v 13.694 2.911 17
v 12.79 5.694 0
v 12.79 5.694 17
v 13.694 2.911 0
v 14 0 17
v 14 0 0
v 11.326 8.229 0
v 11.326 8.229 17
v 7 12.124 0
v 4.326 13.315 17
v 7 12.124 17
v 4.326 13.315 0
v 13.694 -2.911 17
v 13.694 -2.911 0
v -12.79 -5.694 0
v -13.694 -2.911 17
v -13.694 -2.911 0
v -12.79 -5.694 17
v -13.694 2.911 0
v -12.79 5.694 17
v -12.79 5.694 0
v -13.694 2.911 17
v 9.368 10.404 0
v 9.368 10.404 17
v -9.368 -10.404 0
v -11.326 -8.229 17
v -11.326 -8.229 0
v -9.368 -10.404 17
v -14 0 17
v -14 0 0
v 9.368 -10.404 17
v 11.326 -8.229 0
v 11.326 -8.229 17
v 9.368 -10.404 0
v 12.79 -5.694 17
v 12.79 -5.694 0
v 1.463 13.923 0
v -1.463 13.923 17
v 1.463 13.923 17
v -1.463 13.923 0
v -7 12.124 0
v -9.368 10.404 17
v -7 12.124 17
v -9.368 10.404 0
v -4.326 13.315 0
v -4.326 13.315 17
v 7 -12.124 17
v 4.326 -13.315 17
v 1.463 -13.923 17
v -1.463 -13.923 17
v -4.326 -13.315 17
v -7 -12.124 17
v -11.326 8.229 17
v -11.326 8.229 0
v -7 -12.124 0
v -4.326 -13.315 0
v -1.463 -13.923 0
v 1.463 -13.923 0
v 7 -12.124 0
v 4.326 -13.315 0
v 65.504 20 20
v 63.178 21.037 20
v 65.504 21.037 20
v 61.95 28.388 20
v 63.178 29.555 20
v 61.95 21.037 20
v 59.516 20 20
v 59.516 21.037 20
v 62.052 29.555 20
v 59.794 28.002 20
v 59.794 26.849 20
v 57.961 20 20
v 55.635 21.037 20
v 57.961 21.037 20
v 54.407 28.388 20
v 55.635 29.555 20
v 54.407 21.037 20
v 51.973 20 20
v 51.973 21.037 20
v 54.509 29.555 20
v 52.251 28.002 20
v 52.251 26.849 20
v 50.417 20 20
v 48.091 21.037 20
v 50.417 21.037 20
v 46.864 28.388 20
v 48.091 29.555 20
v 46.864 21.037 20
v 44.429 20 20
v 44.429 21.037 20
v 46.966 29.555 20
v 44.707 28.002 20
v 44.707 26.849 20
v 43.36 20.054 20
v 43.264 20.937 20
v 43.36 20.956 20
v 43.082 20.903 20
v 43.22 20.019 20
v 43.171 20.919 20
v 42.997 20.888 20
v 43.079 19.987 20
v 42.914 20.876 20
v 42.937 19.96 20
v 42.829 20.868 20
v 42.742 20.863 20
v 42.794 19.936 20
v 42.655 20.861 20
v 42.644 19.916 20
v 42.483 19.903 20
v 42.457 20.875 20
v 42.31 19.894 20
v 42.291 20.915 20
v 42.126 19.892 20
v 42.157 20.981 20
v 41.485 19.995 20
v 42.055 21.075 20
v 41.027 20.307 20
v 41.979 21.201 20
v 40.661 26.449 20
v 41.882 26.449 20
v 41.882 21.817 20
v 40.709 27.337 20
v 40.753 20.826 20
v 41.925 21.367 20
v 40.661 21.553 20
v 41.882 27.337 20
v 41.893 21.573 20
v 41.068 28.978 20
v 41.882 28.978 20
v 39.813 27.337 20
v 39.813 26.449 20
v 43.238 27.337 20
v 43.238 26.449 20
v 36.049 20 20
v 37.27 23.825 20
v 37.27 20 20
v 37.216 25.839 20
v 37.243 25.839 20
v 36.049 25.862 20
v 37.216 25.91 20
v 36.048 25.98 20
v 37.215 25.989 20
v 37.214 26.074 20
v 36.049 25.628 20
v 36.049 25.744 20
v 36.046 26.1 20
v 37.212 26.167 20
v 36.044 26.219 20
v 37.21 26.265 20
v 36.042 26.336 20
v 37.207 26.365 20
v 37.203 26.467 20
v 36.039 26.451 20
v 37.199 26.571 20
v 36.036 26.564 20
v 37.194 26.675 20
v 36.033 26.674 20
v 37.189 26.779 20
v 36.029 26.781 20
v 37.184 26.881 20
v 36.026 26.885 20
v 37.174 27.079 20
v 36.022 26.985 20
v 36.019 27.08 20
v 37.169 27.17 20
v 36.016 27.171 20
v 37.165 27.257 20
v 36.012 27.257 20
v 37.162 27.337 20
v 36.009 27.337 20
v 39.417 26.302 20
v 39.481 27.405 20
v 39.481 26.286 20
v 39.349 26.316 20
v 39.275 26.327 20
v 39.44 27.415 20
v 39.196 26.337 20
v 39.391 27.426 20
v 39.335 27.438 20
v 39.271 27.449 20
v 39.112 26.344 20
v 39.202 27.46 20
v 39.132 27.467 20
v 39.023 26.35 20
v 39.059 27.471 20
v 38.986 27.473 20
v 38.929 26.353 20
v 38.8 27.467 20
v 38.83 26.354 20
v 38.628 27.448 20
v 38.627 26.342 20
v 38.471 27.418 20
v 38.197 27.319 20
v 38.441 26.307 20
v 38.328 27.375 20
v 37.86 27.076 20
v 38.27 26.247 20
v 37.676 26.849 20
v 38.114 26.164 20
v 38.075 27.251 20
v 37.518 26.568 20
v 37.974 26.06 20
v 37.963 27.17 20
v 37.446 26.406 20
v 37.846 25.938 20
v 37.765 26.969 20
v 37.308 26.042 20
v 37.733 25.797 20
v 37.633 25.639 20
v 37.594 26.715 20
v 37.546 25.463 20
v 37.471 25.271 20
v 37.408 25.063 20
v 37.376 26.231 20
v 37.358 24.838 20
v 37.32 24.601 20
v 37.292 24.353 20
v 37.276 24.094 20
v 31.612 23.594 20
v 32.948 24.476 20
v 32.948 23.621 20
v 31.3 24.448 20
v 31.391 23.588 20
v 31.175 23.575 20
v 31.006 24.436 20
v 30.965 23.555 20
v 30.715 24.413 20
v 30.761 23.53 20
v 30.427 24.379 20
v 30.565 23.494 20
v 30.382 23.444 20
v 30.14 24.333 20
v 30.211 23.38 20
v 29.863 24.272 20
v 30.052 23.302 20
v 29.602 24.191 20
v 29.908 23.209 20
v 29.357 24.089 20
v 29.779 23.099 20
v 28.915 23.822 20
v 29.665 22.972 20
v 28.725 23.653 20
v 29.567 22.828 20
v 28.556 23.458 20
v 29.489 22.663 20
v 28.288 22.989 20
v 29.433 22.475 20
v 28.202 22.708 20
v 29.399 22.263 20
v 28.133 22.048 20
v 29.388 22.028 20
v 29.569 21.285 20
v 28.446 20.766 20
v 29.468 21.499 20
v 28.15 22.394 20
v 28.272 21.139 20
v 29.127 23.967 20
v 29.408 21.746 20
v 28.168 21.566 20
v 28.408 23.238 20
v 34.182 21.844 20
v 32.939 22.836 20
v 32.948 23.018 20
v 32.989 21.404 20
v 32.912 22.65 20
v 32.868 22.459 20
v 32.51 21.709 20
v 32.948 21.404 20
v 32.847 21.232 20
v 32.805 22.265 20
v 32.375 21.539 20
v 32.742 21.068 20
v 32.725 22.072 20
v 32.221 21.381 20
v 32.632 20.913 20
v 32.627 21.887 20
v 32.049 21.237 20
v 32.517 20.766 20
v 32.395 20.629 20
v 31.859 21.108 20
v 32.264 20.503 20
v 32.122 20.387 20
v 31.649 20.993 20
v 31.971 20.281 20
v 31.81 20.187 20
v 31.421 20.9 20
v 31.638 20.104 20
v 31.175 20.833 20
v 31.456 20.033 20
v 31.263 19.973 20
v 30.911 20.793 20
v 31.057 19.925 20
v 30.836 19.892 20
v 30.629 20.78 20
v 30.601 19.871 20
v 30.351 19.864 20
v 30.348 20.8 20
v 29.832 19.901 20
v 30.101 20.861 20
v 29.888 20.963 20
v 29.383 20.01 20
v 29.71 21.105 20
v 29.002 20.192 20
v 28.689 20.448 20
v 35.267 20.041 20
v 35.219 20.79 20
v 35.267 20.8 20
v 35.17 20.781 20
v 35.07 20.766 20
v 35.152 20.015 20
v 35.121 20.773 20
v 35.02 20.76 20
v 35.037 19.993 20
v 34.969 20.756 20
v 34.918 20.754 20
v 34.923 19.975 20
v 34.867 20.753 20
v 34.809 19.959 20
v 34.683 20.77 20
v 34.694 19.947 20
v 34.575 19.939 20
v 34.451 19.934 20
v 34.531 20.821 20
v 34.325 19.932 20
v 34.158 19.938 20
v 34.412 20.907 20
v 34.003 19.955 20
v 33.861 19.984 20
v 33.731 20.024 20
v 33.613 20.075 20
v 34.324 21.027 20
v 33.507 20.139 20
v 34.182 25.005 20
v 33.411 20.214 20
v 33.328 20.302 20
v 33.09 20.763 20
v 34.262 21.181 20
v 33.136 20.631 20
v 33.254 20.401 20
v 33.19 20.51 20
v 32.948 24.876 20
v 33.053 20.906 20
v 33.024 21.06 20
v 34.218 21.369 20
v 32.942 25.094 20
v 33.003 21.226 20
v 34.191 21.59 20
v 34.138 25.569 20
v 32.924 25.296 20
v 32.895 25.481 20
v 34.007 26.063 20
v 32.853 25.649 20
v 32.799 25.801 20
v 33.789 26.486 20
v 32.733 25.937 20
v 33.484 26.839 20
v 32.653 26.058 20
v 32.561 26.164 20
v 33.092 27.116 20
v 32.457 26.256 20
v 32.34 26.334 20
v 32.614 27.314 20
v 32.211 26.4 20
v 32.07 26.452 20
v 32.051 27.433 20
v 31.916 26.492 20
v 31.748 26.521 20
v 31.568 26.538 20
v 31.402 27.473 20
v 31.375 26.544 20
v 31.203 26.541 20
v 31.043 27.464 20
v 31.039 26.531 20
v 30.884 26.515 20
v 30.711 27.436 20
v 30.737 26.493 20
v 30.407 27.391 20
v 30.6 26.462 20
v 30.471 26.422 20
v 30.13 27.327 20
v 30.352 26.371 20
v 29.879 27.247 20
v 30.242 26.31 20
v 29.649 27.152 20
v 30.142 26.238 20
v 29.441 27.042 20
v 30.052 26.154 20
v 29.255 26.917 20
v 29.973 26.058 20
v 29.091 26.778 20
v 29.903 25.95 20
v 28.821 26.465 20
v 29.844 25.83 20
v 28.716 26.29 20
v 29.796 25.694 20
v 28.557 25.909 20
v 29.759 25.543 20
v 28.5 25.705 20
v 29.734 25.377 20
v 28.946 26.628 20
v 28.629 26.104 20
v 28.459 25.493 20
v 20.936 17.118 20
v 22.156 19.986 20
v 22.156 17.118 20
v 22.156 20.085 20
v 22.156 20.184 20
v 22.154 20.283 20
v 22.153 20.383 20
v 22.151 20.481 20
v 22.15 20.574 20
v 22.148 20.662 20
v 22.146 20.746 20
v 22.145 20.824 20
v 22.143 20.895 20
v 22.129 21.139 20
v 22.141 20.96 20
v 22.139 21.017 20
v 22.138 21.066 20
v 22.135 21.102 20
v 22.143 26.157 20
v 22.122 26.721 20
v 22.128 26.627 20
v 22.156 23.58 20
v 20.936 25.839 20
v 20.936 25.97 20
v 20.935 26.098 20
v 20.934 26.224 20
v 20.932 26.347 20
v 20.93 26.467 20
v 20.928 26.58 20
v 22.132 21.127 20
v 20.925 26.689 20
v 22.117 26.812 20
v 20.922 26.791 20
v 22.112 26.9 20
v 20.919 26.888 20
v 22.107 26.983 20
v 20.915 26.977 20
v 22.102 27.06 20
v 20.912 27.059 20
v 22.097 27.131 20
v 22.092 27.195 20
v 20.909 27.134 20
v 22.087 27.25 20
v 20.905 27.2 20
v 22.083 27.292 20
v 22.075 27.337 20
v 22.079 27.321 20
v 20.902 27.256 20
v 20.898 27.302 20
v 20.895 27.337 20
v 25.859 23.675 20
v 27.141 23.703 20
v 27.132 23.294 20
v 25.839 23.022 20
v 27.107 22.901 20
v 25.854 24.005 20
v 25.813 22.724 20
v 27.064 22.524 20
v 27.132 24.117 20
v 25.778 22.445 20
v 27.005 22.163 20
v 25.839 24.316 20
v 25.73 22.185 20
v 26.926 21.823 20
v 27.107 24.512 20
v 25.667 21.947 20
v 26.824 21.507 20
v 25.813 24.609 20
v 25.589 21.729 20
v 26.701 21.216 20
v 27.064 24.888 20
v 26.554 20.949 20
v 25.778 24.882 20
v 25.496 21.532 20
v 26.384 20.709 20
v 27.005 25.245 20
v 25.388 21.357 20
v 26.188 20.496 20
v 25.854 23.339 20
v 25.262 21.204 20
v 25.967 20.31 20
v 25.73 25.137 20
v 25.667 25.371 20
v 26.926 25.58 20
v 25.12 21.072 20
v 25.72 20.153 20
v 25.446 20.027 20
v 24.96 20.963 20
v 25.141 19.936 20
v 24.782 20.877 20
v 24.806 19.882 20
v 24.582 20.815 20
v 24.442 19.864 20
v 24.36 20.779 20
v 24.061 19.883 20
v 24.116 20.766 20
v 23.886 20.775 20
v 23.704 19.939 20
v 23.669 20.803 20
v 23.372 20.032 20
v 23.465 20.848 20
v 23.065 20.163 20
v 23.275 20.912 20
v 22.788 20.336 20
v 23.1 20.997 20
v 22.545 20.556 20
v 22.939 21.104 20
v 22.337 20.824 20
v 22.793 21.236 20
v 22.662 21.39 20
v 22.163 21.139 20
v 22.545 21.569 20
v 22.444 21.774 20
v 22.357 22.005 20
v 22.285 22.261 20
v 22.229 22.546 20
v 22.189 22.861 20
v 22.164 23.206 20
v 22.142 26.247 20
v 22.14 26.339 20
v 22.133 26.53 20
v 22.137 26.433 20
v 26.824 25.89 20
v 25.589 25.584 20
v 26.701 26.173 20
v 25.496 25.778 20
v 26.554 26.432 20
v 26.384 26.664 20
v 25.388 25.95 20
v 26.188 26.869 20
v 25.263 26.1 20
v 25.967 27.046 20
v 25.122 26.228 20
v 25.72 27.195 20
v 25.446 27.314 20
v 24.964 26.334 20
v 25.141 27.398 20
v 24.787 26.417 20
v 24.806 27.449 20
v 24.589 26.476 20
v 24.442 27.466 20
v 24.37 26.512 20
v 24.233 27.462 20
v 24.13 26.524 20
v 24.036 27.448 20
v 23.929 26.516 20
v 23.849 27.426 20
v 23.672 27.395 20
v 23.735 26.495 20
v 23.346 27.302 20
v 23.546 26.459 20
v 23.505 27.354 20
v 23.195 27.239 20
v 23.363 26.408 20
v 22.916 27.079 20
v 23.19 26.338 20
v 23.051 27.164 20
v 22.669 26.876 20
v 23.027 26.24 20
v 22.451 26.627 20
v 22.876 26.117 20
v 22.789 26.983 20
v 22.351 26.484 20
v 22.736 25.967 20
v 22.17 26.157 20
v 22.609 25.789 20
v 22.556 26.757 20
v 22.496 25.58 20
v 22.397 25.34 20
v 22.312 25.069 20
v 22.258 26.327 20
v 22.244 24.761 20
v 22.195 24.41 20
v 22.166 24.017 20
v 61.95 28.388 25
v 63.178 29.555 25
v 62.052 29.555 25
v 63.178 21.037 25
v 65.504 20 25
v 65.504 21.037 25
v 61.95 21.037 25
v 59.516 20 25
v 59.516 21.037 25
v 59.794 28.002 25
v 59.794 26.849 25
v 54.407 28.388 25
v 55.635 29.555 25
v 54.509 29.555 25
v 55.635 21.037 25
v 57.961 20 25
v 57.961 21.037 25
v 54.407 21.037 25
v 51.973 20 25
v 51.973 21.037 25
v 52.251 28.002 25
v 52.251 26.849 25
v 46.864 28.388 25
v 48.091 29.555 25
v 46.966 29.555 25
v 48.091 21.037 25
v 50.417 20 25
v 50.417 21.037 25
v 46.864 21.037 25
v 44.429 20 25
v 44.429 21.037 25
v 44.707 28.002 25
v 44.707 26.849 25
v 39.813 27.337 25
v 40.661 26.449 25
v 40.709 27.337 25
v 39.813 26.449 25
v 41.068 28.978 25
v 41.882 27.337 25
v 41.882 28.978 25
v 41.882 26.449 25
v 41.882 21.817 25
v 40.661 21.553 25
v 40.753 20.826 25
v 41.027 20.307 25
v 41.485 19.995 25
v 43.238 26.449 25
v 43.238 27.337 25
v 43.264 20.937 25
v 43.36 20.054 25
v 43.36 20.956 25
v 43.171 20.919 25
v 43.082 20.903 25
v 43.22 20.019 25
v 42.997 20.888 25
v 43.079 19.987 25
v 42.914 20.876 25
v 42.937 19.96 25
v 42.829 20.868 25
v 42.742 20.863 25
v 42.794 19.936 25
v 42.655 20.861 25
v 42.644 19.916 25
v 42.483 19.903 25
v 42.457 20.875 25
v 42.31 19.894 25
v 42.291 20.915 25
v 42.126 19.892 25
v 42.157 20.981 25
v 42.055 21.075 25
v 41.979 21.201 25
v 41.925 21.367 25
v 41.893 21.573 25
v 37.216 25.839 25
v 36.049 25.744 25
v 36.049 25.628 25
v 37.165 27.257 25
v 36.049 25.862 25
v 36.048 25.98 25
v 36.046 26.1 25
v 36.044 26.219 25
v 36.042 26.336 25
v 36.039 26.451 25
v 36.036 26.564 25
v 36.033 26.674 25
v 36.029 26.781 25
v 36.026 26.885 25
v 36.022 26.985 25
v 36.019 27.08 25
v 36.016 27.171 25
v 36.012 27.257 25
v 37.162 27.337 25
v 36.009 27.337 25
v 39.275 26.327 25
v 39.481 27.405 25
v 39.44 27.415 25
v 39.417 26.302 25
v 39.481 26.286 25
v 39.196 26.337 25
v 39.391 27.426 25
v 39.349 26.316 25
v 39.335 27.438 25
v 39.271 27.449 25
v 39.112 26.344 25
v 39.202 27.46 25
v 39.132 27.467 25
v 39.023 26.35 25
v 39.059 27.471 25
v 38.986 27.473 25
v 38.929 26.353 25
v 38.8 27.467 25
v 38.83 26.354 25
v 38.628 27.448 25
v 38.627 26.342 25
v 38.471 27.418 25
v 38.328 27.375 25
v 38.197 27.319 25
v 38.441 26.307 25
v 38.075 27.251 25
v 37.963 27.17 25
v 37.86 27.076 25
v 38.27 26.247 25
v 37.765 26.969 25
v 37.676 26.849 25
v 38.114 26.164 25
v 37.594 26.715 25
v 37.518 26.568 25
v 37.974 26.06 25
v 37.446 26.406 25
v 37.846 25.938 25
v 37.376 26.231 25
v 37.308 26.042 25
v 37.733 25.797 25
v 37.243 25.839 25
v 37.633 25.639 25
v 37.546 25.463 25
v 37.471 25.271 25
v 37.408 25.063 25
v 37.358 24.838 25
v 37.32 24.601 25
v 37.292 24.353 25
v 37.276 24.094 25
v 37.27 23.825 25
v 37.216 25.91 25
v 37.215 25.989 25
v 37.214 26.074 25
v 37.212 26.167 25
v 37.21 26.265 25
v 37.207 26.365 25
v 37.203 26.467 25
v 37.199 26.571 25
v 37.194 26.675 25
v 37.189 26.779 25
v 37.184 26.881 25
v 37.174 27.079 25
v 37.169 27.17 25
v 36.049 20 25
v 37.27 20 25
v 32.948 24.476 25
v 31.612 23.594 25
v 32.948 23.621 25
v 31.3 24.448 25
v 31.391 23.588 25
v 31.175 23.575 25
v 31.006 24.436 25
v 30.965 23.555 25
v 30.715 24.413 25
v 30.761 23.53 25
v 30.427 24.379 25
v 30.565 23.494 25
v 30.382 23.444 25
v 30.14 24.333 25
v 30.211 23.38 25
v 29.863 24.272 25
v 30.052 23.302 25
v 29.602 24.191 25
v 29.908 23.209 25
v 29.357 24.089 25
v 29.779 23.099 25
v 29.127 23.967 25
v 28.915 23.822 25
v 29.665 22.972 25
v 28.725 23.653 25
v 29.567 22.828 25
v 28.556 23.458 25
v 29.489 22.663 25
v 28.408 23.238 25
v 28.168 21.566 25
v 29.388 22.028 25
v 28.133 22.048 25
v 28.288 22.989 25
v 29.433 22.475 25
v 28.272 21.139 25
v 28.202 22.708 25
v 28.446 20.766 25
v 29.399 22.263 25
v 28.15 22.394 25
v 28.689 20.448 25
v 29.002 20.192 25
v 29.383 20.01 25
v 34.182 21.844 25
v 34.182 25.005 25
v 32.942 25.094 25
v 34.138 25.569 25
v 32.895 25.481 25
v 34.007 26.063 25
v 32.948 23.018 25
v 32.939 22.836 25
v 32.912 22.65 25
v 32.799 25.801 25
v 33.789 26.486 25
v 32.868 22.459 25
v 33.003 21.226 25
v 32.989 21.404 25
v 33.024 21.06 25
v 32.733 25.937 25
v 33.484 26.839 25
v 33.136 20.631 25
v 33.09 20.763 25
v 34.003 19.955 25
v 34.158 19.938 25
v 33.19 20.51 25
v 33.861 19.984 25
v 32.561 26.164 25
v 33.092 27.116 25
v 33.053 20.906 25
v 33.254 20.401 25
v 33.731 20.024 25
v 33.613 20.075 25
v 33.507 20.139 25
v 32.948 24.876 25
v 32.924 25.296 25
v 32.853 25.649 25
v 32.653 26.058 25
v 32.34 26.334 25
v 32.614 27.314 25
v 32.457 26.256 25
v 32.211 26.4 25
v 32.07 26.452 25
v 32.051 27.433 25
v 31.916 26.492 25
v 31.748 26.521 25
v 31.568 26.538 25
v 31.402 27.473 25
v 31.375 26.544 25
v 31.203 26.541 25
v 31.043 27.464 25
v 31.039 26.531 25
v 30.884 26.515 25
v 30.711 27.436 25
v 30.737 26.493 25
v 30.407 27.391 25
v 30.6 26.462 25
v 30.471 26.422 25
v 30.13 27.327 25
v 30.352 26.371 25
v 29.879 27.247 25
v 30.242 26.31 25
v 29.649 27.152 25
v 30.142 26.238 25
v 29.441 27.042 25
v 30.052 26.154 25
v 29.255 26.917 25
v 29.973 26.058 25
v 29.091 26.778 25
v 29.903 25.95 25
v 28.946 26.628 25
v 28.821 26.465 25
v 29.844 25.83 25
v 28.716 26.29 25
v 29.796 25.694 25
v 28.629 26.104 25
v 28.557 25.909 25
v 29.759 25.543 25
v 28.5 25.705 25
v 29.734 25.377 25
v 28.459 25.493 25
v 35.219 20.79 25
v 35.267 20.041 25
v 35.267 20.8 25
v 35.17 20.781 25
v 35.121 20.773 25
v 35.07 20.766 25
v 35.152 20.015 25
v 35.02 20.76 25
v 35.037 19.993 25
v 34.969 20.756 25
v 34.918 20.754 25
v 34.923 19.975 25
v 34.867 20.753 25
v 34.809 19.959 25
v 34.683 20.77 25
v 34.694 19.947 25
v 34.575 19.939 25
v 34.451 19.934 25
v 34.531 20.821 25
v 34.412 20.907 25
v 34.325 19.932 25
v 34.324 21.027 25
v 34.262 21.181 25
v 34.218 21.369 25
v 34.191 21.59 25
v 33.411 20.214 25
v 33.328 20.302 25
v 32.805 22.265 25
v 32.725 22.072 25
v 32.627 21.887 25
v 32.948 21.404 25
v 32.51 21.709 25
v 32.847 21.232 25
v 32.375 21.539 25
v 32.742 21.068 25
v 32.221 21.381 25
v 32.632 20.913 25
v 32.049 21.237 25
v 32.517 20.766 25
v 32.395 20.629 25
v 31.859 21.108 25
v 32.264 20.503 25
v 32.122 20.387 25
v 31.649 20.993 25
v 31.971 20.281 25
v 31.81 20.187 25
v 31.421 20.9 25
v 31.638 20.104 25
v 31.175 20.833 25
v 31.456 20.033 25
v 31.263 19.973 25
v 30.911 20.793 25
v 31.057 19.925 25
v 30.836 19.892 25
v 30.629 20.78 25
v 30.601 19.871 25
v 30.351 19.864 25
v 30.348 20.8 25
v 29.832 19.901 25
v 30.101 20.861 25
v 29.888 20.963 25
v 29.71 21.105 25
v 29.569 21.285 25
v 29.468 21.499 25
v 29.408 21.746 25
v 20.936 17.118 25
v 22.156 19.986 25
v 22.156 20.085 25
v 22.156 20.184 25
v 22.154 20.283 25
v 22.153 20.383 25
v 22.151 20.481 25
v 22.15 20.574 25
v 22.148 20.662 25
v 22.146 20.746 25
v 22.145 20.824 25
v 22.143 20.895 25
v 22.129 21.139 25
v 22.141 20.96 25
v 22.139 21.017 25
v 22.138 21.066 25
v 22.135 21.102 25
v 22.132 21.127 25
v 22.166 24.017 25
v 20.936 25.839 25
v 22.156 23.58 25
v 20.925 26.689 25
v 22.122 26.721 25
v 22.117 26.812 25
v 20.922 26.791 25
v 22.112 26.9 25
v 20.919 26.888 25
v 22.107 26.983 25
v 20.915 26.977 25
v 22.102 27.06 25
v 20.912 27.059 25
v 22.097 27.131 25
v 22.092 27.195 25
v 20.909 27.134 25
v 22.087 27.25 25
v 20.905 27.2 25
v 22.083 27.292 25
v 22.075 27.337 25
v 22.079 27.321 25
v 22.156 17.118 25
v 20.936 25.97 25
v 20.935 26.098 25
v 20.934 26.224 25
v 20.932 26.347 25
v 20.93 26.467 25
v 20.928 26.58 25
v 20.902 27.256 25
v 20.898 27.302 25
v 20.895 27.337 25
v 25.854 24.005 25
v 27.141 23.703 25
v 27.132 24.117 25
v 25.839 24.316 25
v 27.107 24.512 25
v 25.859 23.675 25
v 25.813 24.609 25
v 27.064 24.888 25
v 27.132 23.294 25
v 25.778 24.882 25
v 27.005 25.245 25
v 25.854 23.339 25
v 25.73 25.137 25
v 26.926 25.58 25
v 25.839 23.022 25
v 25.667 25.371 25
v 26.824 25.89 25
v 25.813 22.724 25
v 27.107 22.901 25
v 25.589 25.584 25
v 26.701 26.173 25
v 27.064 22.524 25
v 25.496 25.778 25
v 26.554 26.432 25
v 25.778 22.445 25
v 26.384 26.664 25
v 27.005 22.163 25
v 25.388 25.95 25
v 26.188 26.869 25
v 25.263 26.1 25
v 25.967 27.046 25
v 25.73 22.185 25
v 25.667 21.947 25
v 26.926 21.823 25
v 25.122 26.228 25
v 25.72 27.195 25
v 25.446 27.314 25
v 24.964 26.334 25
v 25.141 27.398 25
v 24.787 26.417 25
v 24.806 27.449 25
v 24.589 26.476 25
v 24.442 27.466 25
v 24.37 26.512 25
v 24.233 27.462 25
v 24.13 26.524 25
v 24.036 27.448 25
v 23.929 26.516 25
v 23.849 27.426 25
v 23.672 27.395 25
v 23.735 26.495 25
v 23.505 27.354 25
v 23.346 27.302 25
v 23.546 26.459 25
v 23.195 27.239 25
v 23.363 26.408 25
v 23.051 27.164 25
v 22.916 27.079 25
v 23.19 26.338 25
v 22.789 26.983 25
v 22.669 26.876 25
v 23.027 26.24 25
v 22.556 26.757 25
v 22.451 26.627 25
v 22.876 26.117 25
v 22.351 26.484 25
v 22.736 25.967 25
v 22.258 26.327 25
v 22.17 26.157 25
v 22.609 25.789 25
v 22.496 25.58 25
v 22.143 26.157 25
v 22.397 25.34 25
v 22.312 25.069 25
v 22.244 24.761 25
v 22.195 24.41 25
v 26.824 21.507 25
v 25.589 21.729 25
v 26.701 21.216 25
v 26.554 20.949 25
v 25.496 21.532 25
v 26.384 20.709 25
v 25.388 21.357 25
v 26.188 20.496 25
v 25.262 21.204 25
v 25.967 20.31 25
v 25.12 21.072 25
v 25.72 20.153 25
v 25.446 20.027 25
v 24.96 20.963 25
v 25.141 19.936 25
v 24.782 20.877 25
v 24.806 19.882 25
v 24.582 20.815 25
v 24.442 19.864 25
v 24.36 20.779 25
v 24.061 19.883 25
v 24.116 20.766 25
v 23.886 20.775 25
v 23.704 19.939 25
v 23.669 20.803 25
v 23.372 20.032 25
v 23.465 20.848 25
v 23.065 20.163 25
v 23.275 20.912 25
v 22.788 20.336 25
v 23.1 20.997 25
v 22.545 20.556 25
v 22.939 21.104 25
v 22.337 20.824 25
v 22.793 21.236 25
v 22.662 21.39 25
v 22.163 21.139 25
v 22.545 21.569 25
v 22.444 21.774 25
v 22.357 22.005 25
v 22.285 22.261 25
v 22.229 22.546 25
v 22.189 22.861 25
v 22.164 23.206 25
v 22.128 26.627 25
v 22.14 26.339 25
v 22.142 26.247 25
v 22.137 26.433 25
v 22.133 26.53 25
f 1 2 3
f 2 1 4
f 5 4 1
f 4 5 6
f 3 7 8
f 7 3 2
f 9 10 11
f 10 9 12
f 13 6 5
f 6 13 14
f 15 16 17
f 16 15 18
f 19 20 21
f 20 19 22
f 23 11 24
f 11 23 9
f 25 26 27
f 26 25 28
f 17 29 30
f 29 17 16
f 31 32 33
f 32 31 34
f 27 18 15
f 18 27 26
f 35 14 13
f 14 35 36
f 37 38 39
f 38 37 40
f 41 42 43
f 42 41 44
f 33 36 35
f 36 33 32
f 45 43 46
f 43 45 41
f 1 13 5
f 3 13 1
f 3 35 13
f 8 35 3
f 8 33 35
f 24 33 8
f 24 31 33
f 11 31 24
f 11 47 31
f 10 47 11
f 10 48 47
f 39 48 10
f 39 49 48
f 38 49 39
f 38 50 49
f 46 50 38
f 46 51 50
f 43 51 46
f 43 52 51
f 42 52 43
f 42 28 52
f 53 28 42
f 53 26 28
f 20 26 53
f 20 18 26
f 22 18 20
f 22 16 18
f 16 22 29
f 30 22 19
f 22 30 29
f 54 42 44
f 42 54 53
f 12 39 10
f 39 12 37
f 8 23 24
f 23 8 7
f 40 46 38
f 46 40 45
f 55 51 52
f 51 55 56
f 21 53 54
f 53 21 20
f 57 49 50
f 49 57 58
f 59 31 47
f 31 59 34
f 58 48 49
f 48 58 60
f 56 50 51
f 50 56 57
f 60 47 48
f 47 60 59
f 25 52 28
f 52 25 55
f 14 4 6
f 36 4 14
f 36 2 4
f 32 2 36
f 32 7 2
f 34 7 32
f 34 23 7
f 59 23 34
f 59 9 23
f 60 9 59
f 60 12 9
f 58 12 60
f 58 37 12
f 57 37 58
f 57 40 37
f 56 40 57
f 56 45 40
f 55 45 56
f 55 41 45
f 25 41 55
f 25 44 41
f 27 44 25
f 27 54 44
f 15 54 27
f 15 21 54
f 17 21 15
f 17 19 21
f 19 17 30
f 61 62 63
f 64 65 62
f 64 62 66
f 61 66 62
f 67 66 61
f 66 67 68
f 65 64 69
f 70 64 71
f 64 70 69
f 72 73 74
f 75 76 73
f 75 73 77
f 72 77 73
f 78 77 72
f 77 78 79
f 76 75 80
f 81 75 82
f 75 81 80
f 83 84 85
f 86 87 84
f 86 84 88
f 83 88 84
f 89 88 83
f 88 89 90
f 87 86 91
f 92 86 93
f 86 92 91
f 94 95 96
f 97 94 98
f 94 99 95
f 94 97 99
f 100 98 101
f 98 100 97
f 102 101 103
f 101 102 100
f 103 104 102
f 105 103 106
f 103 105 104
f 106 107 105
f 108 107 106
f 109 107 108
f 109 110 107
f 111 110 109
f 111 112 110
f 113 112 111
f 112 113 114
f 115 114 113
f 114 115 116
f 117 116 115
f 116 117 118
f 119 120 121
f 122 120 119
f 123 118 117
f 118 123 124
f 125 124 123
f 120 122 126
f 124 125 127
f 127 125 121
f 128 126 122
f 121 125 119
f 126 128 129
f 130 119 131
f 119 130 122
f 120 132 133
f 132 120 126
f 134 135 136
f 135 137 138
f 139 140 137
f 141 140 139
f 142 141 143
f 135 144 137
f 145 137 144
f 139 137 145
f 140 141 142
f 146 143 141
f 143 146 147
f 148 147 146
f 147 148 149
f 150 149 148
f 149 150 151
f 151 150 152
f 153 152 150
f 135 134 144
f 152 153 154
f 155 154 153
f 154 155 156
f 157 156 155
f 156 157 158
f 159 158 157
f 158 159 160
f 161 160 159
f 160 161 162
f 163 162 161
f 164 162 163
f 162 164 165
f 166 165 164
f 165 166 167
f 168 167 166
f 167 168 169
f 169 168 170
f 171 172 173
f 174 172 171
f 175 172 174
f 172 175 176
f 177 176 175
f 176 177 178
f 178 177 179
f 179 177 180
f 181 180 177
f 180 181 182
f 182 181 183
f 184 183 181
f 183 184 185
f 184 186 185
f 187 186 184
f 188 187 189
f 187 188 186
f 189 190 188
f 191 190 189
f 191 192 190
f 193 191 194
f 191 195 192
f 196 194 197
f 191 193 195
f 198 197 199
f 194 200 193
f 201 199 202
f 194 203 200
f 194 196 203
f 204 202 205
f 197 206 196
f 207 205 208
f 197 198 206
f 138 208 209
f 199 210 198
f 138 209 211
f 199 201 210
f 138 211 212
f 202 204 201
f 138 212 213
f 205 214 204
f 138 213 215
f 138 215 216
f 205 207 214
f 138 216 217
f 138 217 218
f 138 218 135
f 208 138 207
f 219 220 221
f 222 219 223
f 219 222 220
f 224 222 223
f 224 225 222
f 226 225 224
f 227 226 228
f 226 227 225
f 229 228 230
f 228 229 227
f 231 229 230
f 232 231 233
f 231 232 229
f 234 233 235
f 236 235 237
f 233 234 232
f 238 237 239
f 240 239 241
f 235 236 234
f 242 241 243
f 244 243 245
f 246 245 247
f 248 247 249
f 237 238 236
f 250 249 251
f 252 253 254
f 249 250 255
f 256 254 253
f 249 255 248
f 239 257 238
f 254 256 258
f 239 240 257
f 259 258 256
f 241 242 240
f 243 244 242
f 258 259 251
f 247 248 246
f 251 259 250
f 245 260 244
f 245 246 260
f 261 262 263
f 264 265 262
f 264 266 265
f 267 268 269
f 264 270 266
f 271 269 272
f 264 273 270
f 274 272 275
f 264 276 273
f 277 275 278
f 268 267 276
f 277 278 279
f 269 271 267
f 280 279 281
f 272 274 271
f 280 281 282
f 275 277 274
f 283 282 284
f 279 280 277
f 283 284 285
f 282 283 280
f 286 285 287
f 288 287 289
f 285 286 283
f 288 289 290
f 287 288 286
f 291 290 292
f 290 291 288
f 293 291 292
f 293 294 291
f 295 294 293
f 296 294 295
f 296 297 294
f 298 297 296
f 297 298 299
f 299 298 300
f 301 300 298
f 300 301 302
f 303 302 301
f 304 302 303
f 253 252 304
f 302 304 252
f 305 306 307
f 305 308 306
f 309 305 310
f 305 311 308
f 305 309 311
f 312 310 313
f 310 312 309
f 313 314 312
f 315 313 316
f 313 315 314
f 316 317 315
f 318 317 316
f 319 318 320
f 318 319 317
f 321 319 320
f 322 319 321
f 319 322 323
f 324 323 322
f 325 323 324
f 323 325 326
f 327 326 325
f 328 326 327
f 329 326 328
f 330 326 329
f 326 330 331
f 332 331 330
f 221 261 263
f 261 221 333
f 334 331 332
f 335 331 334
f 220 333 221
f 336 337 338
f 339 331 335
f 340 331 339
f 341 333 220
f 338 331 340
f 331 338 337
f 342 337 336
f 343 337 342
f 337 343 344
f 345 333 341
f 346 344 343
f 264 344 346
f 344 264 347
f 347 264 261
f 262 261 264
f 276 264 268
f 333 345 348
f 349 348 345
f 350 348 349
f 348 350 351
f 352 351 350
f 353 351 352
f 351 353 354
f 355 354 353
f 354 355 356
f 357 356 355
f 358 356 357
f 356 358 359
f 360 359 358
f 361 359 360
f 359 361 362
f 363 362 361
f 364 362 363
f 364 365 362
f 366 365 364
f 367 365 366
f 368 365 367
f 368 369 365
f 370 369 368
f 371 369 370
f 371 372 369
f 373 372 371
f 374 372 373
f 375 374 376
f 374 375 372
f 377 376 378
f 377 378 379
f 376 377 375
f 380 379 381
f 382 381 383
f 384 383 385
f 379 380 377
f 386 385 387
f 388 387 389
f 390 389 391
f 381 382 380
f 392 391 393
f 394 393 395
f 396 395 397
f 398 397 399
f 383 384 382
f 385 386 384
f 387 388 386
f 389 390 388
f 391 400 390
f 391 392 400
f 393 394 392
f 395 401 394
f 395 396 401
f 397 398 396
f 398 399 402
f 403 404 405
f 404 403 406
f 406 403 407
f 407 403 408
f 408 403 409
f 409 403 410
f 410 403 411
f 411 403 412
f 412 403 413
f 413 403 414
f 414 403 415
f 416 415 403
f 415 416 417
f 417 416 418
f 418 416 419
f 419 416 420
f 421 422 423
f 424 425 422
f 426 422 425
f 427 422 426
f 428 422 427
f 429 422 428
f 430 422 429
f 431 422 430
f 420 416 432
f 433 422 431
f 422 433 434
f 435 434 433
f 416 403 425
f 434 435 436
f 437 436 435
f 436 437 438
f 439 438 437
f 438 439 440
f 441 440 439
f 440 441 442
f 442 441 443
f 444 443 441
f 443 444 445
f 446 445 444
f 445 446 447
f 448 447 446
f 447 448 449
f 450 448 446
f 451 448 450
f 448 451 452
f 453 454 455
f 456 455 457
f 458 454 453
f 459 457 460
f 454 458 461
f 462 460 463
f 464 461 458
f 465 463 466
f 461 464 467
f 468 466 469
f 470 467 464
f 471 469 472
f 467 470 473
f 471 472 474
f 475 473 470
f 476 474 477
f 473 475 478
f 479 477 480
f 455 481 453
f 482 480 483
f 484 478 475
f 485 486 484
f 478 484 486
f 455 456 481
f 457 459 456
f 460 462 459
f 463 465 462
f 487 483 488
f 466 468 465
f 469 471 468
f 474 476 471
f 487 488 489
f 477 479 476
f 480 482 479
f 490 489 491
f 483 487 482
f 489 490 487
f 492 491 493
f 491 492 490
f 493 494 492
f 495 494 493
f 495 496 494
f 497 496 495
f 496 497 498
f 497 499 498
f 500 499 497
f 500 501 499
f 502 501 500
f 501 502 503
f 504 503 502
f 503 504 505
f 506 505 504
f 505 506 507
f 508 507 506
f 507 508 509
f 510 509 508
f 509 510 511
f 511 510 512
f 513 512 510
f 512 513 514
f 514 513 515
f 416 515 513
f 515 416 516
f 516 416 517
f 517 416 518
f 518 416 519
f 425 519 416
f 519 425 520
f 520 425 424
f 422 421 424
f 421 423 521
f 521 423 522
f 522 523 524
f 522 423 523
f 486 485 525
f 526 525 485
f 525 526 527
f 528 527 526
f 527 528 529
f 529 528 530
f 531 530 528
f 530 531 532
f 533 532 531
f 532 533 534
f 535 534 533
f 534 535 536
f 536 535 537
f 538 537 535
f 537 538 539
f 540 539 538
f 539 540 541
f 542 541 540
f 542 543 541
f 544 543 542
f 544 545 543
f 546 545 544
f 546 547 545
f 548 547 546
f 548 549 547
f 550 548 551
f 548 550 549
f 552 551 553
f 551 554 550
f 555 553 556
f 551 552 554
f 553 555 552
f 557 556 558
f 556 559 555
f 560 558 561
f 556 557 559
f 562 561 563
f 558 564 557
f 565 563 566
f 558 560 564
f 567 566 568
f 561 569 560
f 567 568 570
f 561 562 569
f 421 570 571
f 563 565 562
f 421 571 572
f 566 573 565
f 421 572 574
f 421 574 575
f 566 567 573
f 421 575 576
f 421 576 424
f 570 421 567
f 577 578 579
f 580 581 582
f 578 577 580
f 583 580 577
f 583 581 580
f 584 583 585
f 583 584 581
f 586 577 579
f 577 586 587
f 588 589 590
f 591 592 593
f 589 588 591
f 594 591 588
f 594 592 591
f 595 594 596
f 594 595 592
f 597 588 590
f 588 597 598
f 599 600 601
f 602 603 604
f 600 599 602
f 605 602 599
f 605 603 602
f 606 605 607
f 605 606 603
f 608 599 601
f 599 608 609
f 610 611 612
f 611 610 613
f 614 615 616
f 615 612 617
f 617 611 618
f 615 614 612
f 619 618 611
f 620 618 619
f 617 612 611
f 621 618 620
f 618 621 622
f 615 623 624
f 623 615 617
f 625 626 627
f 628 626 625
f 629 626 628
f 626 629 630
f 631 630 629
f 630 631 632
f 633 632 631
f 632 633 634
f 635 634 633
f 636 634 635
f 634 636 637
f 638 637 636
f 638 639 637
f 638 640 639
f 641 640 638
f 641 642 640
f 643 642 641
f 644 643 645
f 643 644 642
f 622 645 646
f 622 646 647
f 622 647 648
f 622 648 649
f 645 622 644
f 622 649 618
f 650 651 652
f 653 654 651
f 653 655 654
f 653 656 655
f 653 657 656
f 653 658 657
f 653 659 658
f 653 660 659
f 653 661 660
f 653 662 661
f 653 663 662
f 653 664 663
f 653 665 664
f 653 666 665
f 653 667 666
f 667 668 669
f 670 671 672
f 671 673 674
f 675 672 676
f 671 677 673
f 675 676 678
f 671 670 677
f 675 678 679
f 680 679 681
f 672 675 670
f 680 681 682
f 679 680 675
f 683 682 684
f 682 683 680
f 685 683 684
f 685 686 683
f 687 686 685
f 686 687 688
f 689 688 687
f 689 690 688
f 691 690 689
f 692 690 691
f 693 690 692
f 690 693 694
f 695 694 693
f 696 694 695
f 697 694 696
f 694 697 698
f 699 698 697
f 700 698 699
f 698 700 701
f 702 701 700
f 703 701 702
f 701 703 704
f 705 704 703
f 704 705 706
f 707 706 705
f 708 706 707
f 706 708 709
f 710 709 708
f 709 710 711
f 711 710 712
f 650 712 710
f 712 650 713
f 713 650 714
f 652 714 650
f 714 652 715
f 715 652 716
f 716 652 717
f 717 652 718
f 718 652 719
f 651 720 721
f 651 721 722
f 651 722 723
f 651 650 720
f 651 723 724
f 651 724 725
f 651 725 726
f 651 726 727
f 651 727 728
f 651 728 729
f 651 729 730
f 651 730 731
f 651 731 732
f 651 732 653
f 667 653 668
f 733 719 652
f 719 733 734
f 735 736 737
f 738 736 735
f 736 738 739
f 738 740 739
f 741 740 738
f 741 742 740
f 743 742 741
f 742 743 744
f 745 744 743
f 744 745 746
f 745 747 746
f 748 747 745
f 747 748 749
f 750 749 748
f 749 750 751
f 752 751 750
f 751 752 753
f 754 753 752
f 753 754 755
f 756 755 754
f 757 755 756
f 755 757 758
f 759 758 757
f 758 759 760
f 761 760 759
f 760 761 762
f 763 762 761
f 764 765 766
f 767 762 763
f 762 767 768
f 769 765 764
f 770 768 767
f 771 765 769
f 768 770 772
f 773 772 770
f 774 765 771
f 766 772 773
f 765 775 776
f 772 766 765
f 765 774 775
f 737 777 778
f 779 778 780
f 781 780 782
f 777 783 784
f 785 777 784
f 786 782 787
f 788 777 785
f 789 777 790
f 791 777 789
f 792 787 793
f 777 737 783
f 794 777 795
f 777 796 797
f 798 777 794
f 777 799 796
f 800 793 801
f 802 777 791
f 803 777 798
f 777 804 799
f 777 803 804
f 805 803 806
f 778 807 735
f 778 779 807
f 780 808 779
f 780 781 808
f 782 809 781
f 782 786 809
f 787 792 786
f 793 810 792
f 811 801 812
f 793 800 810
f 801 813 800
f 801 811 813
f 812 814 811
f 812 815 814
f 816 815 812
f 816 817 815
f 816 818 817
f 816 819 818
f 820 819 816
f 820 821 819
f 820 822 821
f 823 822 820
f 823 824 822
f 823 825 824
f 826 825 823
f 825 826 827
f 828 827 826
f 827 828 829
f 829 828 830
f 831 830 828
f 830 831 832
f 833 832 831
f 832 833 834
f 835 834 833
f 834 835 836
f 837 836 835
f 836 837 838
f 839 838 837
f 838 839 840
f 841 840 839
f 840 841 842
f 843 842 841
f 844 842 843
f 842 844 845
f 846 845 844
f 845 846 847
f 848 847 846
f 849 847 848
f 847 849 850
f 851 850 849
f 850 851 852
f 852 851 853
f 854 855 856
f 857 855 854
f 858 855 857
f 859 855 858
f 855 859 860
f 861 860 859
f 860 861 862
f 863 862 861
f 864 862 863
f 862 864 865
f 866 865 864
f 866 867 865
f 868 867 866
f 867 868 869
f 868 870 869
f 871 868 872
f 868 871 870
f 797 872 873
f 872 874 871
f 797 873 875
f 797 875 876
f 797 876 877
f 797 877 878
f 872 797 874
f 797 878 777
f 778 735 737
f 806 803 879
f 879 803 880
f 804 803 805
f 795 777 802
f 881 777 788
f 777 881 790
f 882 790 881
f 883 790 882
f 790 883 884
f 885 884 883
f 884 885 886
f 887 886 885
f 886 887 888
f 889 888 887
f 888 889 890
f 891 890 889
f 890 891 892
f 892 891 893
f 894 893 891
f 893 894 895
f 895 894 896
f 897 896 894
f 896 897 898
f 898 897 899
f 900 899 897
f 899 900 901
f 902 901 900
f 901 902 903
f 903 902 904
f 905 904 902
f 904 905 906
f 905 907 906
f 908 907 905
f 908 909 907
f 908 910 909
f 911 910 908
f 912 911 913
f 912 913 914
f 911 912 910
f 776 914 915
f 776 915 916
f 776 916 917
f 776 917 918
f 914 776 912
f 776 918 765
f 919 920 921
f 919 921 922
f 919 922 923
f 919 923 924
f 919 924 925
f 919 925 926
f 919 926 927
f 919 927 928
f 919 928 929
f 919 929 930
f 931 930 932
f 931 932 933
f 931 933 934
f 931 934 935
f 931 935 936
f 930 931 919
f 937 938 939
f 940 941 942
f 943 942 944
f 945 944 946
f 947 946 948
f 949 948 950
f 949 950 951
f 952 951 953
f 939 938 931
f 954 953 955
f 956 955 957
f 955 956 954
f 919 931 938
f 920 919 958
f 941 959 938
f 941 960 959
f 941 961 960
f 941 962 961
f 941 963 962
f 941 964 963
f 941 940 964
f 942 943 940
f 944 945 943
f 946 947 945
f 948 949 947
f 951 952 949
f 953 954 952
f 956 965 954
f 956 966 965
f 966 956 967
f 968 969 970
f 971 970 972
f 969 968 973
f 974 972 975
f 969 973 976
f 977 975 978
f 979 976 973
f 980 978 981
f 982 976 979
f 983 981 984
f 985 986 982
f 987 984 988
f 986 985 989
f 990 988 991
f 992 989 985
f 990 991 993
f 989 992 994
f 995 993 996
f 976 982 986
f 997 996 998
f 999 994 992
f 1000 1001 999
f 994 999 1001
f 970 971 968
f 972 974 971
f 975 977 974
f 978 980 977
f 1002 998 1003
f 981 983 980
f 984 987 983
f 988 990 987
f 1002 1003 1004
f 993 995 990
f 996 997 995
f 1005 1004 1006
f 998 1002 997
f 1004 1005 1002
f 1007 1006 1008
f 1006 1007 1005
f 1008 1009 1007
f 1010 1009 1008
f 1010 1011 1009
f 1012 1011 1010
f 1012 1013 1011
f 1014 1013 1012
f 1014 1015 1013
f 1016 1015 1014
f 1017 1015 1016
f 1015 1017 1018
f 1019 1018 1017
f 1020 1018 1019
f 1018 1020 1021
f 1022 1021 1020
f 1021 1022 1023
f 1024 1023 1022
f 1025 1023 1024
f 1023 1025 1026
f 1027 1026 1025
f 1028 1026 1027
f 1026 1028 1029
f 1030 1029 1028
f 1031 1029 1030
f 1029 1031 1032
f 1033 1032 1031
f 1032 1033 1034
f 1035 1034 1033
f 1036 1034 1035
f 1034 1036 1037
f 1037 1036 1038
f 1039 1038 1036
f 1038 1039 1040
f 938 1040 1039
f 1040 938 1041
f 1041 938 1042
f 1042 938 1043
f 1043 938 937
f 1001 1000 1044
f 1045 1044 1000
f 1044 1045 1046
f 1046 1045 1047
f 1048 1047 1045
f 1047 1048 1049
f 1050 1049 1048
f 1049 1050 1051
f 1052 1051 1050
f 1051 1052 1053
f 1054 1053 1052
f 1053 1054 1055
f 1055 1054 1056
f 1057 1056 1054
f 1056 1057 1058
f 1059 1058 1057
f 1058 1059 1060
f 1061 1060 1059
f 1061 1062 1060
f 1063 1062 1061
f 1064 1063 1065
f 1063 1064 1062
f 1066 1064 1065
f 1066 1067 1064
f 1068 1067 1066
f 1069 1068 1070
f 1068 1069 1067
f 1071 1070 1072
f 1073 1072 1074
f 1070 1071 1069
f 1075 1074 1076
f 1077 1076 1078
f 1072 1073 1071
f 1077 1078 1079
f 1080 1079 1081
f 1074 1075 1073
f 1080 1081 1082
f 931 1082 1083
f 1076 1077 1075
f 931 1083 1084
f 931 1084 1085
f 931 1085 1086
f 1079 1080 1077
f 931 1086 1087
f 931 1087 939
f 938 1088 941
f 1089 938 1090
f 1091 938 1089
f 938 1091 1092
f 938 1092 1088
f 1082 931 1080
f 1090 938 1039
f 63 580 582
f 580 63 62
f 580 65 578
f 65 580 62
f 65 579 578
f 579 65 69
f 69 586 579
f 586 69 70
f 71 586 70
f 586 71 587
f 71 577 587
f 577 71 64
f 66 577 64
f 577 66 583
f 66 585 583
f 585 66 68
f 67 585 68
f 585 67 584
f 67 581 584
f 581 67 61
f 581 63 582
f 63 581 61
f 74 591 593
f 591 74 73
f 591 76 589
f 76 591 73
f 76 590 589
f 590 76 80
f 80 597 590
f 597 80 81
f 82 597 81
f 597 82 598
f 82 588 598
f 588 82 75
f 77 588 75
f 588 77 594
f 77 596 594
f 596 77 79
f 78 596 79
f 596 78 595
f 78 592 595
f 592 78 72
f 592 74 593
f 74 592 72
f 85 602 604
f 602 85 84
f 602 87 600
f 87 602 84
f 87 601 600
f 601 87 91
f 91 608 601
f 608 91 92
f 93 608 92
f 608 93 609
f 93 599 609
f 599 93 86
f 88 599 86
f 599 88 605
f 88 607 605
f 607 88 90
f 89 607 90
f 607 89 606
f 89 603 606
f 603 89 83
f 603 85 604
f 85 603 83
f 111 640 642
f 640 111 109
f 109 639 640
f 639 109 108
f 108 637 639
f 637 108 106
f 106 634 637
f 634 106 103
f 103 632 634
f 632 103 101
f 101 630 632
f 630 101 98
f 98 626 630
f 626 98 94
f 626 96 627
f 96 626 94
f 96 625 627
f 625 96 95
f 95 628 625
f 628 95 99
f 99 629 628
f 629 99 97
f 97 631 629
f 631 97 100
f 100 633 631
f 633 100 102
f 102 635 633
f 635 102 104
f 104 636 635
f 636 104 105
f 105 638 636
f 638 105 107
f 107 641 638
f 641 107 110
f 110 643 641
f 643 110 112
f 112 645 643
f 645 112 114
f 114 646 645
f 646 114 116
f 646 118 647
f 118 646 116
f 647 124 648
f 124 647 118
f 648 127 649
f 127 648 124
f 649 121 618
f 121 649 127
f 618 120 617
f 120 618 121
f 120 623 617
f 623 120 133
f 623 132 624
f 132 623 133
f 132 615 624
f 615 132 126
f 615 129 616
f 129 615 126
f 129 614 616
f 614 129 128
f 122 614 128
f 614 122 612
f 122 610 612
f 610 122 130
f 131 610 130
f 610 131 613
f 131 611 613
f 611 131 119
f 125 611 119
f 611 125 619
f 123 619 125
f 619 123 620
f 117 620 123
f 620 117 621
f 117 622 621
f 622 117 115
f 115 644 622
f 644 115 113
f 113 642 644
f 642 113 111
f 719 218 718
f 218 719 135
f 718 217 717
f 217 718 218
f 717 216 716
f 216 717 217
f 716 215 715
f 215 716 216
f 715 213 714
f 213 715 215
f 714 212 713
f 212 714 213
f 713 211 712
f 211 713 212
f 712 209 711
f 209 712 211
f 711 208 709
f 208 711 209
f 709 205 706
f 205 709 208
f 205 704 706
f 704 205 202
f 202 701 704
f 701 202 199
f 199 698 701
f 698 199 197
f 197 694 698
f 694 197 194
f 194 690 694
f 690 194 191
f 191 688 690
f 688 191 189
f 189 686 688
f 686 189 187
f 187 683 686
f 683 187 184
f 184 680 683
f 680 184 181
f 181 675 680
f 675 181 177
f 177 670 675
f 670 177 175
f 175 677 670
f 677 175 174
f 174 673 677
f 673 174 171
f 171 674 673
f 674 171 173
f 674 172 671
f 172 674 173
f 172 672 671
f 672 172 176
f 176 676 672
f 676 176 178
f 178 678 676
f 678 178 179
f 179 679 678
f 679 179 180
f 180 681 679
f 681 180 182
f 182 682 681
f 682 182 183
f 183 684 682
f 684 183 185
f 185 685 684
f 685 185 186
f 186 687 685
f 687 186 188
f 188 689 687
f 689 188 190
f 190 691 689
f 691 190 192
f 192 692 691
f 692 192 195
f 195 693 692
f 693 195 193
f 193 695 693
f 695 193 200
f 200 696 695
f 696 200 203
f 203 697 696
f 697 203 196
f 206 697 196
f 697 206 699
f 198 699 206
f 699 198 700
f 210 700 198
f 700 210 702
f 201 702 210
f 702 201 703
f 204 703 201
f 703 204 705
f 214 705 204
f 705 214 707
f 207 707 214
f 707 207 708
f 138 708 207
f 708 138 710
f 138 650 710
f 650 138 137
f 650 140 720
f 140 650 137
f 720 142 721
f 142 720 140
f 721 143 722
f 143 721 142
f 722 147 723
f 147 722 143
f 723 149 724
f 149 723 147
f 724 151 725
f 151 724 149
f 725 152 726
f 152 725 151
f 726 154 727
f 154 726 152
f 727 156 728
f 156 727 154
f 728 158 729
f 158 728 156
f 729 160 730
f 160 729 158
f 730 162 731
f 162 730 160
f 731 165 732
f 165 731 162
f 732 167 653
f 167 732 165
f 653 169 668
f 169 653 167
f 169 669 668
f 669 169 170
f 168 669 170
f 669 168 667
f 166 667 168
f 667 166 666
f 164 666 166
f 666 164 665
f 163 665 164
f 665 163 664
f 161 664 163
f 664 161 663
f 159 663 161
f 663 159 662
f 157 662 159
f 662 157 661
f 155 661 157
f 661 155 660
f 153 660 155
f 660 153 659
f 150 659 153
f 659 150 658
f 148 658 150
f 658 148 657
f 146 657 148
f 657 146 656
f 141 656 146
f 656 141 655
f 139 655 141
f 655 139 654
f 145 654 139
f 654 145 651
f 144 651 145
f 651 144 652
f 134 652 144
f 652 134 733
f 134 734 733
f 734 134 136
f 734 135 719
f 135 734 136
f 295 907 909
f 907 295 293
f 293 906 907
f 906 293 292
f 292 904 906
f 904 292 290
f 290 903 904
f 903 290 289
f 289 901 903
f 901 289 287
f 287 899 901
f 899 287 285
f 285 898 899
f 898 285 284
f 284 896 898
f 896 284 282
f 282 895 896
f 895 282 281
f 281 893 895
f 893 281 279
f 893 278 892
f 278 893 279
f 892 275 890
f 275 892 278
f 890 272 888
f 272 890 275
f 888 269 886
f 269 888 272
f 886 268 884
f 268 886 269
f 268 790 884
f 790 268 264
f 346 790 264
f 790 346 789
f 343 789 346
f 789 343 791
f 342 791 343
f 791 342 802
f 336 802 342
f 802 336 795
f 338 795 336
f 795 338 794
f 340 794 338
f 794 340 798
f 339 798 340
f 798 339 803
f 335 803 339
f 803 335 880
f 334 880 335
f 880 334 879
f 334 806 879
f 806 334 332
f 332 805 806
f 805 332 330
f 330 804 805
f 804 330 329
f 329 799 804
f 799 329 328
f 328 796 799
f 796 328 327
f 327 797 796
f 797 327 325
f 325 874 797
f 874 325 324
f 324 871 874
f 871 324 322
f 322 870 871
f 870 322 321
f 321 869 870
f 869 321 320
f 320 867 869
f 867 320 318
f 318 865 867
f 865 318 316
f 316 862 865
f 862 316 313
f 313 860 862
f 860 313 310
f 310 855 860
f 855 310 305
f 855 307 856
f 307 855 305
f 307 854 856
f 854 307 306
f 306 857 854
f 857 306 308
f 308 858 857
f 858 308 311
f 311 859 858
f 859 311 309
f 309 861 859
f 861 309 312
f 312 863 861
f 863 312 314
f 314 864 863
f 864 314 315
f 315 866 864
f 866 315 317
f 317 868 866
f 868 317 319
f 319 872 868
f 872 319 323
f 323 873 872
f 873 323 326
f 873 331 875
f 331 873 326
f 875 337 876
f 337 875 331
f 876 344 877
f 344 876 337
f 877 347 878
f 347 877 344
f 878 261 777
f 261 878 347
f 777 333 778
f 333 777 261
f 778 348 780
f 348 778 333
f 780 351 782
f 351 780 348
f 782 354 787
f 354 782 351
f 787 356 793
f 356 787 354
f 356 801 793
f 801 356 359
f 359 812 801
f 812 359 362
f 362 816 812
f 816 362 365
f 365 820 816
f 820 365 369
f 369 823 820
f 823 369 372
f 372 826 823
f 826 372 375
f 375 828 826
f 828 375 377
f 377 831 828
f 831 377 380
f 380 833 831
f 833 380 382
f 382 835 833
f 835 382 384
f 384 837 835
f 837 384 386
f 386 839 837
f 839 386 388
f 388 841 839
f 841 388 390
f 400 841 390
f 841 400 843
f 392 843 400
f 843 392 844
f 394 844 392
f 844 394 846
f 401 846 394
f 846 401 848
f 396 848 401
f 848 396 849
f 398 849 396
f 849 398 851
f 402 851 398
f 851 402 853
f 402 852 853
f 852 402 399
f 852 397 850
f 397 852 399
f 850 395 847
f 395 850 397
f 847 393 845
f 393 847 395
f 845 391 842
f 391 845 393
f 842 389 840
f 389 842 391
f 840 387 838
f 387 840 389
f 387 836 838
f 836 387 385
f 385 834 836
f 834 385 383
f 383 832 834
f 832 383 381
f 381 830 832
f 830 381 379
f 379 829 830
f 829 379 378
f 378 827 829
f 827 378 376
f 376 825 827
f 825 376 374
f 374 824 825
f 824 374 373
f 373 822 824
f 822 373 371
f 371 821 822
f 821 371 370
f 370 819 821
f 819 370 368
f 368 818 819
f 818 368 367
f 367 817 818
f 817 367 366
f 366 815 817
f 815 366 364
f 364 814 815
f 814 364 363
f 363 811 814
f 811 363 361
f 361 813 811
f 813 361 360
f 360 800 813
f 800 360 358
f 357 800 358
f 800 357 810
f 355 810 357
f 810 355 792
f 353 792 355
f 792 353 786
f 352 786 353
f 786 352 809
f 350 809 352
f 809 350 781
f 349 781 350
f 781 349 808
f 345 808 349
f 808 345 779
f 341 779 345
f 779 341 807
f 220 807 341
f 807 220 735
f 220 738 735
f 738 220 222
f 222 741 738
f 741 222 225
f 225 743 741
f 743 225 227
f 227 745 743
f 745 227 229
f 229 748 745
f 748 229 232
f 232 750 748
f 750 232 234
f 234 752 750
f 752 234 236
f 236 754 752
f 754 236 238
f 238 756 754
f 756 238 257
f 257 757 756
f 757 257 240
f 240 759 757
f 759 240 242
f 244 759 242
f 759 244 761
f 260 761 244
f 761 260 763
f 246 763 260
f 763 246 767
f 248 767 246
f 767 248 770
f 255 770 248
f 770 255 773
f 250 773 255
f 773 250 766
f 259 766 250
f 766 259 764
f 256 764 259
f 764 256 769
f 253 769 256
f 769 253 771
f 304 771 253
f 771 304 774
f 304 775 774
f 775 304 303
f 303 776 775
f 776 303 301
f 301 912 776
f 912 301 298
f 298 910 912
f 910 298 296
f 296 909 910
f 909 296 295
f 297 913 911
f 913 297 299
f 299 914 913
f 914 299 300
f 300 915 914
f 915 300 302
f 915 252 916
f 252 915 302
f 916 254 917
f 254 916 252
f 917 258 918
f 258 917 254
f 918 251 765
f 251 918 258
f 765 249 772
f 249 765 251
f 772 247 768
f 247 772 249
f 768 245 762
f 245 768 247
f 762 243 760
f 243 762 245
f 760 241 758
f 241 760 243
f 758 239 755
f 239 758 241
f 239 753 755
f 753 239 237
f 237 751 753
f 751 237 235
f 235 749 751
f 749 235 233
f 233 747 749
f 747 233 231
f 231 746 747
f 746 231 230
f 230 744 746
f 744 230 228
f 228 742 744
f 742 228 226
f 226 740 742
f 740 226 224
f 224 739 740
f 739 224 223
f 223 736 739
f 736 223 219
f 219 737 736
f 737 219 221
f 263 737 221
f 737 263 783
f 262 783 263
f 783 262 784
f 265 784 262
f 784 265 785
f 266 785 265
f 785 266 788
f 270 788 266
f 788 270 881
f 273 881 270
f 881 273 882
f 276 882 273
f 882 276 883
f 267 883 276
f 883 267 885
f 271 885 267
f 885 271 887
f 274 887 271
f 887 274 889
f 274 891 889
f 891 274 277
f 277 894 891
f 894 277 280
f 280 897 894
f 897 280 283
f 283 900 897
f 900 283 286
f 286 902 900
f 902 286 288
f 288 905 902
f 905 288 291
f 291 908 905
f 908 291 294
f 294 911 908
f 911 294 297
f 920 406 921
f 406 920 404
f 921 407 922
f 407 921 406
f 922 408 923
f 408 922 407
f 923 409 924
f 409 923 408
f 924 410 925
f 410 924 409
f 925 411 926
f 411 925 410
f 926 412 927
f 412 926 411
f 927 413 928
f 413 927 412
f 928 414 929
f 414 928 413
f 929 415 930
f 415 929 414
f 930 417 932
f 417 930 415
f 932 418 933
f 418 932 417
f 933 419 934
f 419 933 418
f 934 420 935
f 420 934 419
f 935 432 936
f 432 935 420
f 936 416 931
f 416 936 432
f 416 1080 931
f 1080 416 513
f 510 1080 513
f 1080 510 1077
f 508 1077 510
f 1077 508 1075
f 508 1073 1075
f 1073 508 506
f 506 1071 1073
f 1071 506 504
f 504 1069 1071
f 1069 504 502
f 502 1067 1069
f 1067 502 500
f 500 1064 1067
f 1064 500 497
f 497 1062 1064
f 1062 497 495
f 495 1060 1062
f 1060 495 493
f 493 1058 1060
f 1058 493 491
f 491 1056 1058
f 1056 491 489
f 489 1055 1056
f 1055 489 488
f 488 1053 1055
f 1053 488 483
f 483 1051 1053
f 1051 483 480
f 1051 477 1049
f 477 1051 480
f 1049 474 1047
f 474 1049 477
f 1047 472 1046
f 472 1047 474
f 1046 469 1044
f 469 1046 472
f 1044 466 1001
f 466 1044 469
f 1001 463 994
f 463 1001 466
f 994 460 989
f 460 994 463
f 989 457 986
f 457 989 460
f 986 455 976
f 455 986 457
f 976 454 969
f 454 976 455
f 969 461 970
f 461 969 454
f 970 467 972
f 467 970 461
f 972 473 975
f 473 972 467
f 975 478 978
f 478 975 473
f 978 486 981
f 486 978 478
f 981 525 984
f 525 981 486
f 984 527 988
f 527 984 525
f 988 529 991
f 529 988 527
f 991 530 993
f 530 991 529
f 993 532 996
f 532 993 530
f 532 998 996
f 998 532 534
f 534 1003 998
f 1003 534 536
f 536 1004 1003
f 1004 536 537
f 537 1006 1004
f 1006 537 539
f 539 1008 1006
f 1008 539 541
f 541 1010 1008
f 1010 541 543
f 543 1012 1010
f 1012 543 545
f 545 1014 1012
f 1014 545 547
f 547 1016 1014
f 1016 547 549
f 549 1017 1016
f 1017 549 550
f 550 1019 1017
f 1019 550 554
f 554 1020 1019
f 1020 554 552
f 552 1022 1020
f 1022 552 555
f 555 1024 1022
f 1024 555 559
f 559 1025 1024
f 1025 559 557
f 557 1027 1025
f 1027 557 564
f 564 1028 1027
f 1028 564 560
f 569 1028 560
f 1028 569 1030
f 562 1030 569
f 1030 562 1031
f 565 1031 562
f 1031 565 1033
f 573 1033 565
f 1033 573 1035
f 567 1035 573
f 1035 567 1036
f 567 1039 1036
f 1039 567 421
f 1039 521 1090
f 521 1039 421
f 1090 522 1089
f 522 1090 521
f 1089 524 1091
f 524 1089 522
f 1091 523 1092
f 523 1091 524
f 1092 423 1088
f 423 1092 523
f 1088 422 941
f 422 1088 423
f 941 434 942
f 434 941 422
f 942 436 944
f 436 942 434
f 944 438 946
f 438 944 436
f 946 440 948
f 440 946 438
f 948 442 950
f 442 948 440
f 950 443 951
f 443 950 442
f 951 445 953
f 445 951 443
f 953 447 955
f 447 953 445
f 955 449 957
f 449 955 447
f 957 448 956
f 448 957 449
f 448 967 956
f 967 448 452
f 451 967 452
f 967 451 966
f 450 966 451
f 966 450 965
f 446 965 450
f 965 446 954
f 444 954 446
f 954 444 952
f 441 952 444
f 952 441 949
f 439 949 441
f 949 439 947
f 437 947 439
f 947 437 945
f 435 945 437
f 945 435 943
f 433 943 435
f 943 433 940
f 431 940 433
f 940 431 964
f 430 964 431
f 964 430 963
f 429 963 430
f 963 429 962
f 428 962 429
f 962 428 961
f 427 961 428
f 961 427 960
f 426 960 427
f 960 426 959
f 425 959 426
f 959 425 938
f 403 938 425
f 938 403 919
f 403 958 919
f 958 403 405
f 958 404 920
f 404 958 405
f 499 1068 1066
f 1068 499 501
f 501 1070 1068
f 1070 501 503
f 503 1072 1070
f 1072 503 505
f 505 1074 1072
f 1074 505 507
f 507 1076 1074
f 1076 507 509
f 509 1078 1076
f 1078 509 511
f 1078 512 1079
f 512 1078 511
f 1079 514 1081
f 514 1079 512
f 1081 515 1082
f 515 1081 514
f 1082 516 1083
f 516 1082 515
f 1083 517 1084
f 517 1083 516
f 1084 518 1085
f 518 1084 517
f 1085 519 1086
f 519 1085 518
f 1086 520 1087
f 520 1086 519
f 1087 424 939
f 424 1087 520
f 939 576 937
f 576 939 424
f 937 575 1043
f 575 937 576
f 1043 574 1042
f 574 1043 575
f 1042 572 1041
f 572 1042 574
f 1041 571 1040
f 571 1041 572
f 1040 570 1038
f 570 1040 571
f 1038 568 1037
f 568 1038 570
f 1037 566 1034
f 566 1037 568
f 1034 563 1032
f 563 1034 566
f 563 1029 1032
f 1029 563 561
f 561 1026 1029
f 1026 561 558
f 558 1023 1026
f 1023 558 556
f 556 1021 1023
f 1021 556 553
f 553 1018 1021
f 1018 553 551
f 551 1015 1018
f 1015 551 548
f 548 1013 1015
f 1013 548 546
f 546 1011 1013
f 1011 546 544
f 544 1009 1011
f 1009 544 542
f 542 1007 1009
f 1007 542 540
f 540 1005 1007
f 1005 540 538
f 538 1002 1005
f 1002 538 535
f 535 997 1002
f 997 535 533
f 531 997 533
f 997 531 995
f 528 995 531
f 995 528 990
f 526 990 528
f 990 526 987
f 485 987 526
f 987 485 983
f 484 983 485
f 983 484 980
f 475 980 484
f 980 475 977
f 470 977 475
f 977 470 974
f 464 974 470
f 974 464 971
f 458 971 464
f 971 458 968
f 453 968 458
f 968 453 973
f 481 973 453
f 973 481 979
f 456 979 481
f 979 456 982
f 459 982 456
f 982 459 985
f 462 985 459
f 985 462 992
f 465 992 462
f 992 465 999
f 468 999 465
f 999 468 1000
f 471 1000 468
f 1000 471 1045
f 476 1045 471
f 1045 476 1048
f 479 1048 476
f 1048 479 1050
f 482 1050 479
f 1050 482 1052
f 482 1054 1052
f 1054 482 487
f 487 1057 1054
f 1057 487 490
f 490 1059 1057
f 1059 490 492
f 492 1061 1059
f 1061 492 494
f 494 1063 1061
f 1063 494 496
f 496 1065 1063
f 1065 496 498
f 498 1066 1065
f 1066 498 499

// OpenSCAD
//[CUSTOMIZATION]
// Height
h=17; // [5,10,20]
// Radius
r1=14; // [20]
// Message
txt="part111";
module __END_CUSTOMIZATIONS () { }
cylinder(h,r1,r1);
translate([20,20,20]) { linear_extrude(5) text(txt, font="Liberation Sans"); }
